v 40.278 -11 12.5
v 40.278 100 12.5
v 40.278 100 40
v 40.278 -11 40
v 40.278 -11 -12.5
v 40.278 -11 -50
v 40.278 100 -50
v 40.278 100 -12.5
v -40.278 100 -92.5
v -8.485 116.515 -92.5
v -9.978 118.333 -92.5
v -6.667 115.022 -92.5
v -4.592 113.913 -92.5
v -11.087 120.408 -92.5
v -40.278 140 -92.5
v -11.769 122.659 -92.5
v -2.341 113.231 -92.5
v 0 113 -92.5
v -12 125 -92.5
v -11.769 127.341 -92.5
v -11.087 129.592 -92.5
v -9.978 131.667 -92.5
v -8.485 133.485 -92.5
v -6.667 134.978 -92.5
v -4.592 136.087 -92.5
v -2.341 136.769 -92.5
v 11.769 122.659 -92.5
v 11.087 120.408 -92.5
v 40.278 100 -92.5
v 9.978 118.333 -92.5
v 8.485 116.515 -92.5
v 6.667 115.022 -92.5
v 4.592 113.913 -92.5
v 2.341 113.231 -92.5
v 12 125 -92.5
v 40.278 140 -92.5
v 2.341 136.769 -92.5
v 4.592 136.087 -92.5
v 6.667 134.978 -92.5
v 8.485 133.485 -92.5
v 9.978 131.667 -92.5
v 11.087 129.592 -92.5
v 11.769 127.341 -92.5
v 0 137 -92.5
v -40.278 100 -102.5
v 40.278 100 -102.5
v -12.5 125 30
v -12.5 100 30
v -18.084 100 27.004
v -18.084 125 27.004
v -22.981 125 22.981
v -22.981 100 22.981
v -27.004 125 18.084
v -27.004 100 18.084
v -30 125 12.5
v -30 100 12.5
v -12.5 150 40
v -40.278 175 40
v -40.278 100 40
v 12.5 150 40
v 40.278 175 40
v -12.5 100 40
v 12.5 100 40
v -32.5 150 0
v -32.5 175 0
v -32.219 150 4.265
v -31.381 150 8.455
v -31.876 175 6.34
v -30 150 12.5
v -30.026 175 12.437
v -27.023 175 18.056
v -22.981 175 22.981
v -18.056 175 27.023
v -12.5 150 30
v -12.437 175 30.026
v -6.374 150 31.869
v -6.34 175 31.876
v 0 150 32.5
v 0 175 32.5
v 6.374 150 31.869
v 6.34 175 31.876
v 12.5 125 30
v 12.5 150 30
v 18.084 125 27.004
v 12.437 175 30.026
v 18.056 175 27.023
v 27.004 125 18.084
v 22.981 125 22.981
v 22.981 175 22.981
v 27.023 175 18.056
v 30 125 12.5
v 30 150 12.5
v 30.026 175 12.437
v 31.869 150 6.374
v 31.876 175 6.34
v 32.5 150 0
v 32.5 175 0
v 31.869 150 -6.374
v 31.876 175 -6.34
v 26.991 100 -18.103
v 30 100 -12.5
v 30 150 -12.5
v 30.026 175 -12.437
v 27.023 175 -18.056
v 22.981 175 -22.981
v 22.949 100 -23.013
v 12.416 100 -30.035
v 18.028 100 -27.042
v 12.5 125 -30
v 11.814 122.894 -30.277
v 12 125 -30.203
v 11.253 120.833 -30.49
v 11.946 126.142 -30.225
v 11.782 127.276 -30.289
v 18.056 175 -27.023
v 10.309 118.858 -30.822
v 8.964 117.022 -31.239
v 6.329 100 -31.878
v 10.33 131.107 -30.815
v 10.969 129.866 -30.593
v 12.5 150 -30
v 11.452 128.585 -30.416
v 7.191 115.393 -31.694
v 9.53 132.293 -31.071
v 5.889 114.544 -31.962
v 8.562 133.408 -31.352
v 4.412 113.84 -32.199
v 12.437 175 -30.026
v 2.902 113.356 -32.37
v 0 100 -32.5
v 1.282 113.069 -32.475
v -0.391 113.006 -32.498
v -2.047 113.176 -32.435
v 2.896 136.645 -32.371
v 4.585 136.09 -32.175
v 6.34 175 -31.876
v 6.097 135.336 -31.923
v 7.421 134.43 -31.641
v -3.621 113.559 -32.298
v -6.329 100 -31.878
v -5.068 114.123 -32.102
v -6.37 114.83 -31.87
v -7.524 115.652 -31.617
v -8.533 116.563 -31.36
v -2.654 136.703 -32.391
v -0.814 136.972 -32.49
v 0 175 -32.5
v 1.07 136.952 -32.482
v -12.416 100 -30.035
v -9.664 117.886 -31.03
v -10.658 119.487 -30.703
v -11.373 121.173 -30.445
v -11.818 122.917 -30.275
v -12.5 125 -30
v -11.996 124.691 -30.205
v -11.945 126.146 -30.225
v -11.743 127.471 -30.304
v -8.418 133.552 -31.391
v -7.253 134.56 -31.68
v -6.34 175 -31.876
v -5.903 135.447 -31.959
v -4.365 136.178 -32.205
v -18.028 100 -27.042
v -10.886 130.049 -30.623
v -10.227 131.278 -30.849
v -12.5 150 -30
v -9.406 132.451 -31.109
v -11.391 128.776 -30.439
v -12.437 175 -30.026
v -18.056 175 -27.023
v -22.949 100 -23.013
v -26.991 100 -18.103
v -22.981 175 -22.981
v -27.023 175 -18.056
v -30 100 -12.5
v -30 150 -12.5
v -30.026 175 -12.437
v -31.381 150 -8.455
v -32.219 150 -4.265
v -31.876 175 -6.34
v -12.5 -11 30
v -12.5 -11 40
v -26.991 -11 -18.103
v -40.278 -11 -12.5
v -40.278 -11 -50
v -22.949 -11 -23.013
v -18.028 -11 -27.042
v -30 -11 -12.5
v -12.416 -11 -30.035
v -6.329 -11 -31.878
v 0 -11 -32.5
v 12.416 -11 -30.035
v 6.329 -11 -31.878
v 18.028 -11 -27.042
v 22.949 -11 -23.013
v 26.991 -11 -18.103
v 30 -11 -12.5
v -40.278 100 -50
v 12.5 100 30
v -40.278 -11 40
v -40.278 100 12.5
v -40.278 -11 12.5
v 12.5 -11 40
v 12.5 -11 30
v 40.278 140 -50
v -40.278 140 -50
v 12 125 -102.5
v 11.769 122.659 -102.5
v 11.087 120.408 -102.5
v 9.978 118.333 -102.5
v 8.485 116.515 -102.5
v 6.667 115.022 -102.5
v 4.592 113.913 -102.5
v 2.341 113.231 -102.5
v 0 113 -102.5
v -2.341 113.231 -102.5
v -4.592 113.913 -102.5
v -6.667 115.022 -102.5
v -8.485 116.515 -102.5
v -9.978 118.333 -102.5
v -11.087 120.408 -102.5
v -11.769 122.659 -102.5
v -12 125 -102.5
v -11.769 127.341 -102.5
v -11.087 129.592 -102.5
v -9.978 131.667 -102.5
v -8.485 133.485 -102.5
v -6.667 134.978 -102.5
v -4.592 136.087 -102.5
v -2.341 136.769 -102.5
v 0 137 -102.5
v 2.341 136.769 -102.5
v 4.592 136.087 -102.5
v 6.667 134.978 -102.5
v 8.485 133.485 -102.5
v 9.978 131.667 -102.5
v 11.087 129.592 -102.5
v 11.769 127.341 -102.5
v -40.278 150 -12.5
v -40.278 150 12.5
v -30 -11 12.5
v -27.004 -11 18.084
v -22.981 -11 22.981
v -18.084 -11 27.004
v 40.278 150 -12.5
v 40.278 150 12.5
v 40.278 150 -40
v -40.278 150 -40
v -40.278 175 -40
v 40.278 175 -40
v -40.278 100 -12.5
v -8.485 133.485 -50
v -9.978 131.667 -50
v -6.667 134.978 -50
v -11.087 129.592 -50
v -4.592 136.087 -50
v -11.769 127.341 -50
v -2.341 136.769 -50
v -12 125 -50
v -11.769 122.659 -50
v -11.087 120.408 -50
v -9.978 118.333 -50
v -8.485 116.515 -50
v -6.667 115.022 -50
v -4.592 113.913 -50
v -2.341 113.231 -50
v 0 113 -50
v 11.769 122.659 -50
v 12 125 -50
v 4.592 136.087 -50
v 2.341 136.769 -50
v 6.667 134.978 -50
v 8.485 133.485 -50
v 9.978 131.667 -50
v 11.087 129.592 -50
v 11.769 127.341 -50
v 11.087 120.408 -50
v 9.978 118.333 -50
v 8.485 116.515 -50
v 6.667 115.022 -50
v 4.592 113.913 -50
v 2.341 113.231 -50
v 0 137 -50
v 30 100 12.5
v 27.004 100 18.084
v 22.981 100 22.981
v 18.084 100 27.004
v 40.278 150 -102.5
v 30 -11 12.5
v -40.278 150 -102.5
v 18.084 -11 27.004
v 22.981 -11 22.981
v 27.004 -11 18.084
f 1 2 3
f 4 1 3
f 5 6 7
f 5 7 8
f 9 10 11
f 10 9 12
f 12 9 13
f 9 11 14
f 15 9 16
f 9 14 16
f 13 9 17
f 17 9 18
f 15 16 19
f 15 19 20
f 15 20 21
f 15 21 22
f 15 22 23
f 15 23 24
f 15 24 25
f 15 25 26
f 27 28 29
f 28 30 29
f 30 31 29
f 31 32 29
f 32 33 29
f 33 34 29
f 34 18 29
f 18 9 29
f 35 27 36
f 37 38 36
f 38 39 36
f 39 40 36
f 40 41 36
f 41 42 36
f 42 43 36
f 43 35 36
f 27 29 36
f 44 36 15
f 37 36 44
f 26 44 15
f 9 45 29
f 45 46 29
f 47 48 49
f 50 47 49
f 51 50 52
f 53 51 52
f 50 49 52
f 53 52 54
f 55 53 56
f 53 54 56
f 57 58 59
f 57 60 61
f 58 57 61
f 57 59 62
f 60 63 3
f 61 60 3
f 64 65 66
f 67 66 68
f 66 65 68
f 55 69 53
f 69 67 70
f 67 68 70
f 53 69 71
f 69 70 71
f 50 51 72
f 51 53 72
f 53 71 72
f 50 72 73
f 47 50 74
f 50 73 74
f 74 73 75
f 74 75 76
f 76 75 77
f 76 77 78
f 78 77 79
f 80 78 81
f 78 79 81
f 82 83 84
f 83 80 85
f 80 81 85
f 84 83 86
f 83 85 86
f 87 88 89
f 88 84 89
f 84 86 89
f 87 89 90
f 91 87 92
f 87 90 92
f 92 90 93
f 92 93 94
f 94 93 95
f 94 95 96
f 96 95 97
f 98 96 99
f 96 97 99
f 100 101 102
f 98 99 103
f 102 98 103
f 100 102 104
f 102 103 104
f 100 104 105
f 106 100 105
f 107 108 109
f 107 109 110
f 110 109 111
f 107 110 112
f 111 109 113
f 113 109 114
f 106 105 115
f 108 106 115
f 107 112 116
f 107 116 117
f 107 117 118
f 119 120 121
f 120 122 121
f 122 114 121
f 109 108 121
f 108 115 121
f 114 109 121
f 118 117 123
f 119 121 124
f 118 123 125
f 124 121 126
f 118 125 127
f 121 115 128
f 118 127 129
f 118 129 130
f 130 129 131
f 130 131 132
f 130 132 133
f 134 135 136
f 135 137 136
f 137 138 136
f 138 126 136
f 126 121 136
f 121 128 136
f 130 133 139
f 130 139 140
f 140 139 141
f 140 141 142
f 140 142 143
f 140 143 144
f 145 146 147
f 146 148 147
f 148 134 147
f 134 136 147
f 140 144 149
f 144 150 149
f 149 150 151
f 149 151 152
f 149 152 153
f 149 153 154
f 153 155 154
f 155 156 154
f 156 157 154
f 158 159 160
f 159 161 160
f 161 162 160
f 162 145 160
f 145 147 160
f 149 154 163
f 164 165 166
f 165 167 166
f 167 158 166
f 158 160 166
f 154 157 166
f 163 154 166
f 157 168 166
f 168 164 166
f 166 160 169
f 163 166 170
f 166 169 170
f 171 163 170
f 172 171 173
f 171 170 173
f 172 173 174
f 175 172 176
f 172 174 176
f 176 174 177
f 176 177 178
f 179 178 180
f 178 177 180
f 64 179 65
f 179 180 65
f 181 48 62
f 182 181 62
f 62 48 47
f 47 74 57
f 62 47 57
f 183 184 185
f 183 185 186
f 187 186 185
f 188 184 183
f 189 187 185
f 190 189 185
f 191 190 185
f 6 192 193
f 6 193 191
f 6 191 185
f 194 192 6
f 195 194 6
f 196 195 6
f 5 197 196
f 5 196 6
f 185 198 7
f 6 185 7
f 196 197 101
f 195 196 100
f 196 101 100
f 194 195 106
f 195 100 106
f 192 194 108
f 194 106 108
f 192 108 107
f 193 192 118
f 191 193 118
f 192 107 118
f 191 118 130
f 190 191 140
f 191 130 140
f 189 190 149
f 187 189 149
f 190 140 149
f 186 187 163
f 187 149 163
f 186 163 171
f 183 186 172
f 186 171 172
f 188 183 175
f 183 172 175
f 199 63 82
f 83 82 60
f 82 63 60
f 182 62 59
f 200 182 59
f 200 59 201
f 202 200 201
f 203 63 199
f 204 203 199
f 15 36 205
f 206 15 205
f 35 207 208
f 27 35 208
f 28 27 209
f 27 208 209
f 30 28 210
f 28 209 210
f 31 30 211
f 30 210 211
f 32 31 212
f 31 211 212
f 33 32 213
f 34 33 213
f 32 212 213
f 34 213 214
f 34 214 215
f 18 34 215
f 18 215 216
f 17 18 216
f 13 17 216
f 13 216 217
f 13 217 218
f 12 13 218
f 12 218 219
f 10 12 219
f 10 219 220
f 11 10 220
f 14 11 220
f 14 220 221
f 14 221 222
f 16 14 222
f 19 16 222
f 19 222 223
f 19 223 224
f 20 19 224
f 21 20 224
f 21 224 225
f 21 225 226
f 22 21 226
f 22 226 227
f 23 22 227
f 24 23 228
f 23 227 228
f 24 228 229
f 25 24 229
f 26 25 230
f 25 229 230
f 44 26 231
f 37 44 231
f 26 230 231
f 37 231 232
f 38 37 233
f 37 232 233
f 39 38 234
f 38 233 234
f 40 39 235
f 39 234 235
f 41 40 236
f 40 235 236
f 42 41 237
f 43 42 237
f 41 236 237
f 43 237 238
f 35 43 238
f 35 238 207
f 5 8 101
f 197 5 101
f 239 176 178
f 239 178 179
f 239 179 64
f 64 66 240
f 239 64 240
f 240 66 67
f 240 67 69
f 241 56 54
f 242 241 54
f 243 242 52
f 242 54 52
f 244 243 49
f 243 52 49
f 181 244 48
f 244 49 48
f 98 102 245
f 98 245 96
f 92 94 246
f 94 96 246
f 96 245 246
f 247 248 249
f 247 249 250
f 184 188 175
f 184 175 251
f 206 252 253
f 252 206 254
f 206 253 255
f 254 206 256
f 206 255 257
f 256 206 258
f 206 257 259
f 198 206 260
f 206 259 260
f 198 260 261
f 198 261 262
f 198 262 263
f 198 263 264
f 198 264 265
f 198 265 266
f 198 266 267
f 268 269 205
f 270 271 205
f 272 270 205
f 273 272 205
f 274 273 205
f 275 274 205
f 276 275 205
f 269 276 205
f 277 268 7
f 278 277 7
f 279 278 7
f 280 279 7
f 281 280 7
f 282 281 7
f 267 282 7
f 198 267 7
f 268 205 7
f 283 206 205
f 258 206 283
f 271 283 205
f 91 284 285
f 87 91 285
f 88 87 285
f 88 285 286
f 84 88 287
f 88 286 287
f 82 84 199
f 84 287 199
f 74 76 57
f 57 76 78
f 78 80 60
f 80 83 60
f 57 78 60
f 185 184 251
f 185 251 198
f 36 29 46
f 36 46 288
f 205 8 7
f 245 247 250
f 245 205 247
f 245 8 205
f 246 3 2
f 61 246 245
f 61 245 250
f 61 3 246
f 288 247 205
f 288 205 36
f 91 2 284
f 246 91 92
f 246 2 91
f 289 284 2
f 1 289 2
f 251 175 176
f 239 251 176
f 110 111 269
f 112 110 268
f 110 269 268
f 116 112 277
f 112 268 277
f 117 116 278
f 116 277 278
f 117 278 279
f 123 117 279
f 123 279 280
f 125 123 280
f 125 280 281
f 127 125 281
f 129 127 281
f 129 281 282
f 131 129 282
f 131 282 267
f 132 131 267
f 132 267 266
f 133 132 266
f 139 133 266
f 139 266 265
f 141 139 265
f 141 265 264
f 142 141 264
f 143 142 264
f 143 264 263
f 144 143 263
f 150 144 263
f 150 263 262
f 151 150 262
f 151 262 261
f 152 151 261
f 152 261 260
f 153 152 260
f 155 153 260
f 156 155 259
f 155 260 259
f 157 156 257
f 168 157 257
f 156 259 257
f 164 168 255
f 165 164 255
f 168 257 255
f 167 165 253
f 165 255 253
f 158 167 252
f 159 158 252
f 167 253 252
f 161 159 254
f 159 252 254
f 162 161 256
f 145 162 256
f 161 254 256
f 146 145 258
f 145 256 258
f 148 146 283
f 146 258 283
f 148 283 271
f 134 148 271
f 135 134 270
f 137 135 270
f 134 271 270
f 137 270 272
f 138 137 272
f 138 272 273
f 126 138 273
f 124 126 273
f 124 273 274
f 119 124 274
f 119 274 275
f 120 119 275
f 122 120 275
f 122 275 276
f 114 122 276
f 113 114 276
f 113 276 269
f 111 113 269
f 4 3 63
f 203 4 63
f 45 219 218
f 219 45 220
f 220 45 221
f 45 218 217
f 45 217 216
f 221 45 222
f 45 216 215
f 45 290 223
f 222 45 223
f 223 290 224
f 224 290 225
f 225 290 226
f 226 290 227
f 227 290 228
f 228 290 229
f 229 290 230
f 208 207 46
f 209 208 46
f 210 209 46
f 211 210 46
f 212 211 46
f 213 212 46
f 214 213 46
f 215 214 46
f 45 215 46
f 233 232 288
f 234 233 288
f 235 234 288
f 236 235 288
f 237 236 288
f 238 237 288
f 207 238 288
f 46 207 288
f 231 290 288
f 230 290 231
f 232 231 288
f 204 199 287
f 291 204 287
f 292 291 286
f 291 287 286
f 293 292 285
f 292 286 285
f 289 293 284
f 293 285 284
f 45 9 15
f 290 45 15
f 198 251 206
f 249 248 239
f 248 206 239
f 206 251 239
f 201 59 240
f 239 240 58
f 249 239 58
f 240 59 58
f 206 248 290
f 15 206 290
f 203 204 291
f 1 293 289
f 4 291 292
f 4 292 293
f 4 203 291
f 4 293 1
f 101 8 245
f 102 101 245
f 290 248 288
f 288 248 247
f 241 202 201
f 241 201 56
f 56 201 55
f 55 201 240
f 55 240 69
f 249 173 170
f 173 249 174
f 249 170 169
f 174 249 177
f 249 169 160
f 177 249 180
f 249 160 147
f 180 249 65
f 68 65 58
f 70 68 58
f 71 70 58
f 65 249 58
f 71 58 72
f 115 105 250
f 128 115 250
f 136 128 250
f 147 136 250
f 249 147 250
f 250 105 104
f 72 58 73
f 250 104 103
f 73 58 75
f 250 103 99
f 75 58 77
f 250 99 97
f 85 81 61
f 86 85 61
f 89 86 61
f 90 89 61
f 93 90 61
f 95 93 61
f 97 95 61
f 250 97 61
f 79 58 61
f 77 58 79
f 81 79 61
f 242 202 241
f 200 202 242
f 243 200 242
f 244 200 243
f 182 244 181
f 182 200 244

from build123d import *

# Parameters (mm, degrees)
F0_W           = 80.5555507541
F0_H           = 80
F1_DEPTH       = 175
F2_R           = 32.5
F3_DEPTH       = 300
F4_W           = 25
F4_H           = 300
F5_DEPTH       = 80.001
F6_W           = 300
F6_H           = 25
F7_DEPTH       = 80.5565507541
F8_W           = 80.5555507541
F8_H           = 48.411038518
F9_DEPTH       = 25
F10_R          = 14.0956143059
F11_DEPTH      = 25.001
F13_W          = 80.5555507541
F13_H          = 50
F14_DEPTH      = 10
F14_DEPTH_BACK = 62.5
F15_DEPTH      = 25
F17_DEPTH      = 80.5565507541
F18_R          = 32.5
F19_DEPTH      = 75.001
F20_W          = 3.1050710324
F20_H          = 42.5
F20_W_2        = 40
F21_DEPTH      = 80.5565507541
F22_R          = 12
F23_DEPTH      = 142.501
F24_DEPTH      = 111


with BuildPart() as f1:
    # F0 (on Front) → F1 (new body, symmetric)
    with BuildSketch(Plane.XZ):
        Rectangle(F0_W, F0_H)
    extrude(amount=F1_DEPTH, both=True)

    # F2 (on face) → F3 (cut)
    with BuildSketch(Plane.XZ.offset(175)):
        Circle(F2_R)
    extrude(amount=-F3_DEPTH, mode=Mode.SUBTRACT)

    # F4 (on face) → F5 (cut, through all)
    with BuildSketch(Plane.XY.offset(40)):
        Rectangle(F4_W, F4_H)
    extrude(amount=-F5_DEPTH, mode=Mode.SUBTRACT)

    # F6 (on face) → F7 (cut, through all)
    with BuildSketch(Plane.YZ.offset(40.277775377)):
        Rectangle(F6_W, F6_H)
    extrude(amount=-F7_DEPTH, mode=Mode.SUBTRACT)

    # F8 (on face) → F9 (join)
    with BuildSketch(Plane(origin=(0, 0, -40), x_dir=(1, 0, 0), z_dir=(0, 0, -1))):
        with Locations((0, -199.205519259)):
            Rectangle(F8_W, F8_H)
    extrude(amount=-F9_DEPTH)

    # F10 (on face) → F11 (cut, through all)
    with BuildSketch(Plane.XY.offset(-15)):
        with Locations((0, 199.205519259)):
            Circle(F10_R)
    extrude(amount=-F11_DEPTH, mode=Mode.SUBTRACT)

    # F13 (on offset) → F14 (join, two sides)
    with BuildSketch(Plane.XY.offset(-40)) as f14_sk:
        with Locations((0, 125)):
            Rectangle(F13_W, F13_H)
    extrude(amount=F14_DEPTH)
    extrude(f14_sk.sketch, amount=-F14_DEPTH_BACK)

    # F15 (cut): a face of the model
    f15_faces = [f1.faces().sort_by_distance(p)[0] for p in [
        (0, 175.9398311235, -15),
    ]]
    extrude(f15_faces, amount=-F15_DEPTH, mode=Mode.SUBTRACT)

    # F16 (on face) → F17 (cut, through all)
    with BuildSketch(Plane.YZ.offset(40.277775377)):
        Polygon((100, 79.5669853687), (-178.8060516119, 79.5669853687), (-178.8060516119, -116.9548779726), (100, -116.9548779726), (100, -102.5), (100, -40), (-175, -40), (-175, 40), (100, 40), align=None)
        Polygon((100, 12.5), (100, 40), (-175, 40), (-175, -40), (100, -40), (100, -12.5), (-150, -12.5), (-150, 12.5), align=None)
    extrude(amount=-F17_DEPTH, mode=Mode.SUBTRACT)

    # F18 (on face) → F19 (cut, through all)
    with BuildSketch(Plane(origin=(0, 175, 0), x_dir=(-1, 0, 0), z_dir=(0, 1, 0))):
        Circle(F18_R)
    extrude(amount=-F19_DEPTH, mode=Mode.SUBTRACT)

    # F20 (on face) → F21 (cut, through all)
    with BuildSketch(Plane.YZ.offset(40.277775377)):
        with Locations((98.4474644838, -71.25)):
            Rectangle(F20_W, F20_H)
        with Locations((120, -71.25)):
            Rectangle(F20_W_2, F20_H)
    extrude(amount=-F21_DEPTH, mode=Mode.SUBTRACT)

    # F22 (on face) → F23 (cut, through all)
    with BuildSketch(Plane(origin=(0, 0, -102.5), x_dir=(1, 0, 0), z_dir=(0, 0, -1))):
        with Locations((0, -125)):
            Circle(F22_R)
    extrude(amount=-F23_DEPTH, mode=Mode.SUBTRACT)

    # F17_face (on face) + F21_face (on face) → F24 (join)
    with BuildSketch(Plane(origin=(-28.870034174, 100, 28.6839226626), x_dir=(1, 0, 0), z_dir=(0, -1, 0))):
        with BuildLine():
            ThreePointArc((-1.129965826, -16.1839226626), (5.8890637854, -5.7029522741), (16.370034174, 1.3160773374))
            Line((16.370034174, 1.3160773374), (16.370034174, 11.3160773374))
            Line((16.370034174, 11.3160773374), (-11.4077412031, 11.3160773374))
            Line((-11.4077412031, 11.3160773374), (-11.4077412031, -16.1839226626))
            Line((-11.4077412031, -16.1839226626), (-1.129965826, -16.1839226626))
        make_face()
        with BuildLine():
            Line((69.147809551, -16.1839226626), (69.147809551, 11.3160773374))
            Line((69.147809551, 11.3160773374), (41.370034174, 11.3160773374))
            Line((41.370034174, 11.3160773374), (41.370034174, 1.3160773374))
            ThreePointArc((41.370034174, 1.3160773374), (51.8510045625, -5.7029522741), (58.870034174, -16.1839226626))
            Line((58.870034174, -16.1839226626), (69.147809551, -16.1839226626))
        make_face()
    with BuildSketch(Plane(origin=(0, 100, -35.4746848598), x_dir=(1, 0, 0), z_dir=(0, -1, 0))):
        with BuildLine():
            Line((-40.277775377, 22.9746848598), (-40.277775377, -14.5253151402))
            Line((-40.277775377, -14.5253151402), (40.277775377, -14.5253151402))
            Line((40.277775377, -14.5253151402), (40.277775377, 22.9746848598))
            Line((40.277775377, 22.9746848598), (30, 22.9746848598))
            ThreePointArc((30, 22.9746848598), (0, 2.9746848598), (-30, 22.9746848598))
            Line((-30, 22.9746848598), (-40.277775377, 22.9746848598))
        make_face()
    extrude(amount=F24_DEPTH)


solid = f1.part
